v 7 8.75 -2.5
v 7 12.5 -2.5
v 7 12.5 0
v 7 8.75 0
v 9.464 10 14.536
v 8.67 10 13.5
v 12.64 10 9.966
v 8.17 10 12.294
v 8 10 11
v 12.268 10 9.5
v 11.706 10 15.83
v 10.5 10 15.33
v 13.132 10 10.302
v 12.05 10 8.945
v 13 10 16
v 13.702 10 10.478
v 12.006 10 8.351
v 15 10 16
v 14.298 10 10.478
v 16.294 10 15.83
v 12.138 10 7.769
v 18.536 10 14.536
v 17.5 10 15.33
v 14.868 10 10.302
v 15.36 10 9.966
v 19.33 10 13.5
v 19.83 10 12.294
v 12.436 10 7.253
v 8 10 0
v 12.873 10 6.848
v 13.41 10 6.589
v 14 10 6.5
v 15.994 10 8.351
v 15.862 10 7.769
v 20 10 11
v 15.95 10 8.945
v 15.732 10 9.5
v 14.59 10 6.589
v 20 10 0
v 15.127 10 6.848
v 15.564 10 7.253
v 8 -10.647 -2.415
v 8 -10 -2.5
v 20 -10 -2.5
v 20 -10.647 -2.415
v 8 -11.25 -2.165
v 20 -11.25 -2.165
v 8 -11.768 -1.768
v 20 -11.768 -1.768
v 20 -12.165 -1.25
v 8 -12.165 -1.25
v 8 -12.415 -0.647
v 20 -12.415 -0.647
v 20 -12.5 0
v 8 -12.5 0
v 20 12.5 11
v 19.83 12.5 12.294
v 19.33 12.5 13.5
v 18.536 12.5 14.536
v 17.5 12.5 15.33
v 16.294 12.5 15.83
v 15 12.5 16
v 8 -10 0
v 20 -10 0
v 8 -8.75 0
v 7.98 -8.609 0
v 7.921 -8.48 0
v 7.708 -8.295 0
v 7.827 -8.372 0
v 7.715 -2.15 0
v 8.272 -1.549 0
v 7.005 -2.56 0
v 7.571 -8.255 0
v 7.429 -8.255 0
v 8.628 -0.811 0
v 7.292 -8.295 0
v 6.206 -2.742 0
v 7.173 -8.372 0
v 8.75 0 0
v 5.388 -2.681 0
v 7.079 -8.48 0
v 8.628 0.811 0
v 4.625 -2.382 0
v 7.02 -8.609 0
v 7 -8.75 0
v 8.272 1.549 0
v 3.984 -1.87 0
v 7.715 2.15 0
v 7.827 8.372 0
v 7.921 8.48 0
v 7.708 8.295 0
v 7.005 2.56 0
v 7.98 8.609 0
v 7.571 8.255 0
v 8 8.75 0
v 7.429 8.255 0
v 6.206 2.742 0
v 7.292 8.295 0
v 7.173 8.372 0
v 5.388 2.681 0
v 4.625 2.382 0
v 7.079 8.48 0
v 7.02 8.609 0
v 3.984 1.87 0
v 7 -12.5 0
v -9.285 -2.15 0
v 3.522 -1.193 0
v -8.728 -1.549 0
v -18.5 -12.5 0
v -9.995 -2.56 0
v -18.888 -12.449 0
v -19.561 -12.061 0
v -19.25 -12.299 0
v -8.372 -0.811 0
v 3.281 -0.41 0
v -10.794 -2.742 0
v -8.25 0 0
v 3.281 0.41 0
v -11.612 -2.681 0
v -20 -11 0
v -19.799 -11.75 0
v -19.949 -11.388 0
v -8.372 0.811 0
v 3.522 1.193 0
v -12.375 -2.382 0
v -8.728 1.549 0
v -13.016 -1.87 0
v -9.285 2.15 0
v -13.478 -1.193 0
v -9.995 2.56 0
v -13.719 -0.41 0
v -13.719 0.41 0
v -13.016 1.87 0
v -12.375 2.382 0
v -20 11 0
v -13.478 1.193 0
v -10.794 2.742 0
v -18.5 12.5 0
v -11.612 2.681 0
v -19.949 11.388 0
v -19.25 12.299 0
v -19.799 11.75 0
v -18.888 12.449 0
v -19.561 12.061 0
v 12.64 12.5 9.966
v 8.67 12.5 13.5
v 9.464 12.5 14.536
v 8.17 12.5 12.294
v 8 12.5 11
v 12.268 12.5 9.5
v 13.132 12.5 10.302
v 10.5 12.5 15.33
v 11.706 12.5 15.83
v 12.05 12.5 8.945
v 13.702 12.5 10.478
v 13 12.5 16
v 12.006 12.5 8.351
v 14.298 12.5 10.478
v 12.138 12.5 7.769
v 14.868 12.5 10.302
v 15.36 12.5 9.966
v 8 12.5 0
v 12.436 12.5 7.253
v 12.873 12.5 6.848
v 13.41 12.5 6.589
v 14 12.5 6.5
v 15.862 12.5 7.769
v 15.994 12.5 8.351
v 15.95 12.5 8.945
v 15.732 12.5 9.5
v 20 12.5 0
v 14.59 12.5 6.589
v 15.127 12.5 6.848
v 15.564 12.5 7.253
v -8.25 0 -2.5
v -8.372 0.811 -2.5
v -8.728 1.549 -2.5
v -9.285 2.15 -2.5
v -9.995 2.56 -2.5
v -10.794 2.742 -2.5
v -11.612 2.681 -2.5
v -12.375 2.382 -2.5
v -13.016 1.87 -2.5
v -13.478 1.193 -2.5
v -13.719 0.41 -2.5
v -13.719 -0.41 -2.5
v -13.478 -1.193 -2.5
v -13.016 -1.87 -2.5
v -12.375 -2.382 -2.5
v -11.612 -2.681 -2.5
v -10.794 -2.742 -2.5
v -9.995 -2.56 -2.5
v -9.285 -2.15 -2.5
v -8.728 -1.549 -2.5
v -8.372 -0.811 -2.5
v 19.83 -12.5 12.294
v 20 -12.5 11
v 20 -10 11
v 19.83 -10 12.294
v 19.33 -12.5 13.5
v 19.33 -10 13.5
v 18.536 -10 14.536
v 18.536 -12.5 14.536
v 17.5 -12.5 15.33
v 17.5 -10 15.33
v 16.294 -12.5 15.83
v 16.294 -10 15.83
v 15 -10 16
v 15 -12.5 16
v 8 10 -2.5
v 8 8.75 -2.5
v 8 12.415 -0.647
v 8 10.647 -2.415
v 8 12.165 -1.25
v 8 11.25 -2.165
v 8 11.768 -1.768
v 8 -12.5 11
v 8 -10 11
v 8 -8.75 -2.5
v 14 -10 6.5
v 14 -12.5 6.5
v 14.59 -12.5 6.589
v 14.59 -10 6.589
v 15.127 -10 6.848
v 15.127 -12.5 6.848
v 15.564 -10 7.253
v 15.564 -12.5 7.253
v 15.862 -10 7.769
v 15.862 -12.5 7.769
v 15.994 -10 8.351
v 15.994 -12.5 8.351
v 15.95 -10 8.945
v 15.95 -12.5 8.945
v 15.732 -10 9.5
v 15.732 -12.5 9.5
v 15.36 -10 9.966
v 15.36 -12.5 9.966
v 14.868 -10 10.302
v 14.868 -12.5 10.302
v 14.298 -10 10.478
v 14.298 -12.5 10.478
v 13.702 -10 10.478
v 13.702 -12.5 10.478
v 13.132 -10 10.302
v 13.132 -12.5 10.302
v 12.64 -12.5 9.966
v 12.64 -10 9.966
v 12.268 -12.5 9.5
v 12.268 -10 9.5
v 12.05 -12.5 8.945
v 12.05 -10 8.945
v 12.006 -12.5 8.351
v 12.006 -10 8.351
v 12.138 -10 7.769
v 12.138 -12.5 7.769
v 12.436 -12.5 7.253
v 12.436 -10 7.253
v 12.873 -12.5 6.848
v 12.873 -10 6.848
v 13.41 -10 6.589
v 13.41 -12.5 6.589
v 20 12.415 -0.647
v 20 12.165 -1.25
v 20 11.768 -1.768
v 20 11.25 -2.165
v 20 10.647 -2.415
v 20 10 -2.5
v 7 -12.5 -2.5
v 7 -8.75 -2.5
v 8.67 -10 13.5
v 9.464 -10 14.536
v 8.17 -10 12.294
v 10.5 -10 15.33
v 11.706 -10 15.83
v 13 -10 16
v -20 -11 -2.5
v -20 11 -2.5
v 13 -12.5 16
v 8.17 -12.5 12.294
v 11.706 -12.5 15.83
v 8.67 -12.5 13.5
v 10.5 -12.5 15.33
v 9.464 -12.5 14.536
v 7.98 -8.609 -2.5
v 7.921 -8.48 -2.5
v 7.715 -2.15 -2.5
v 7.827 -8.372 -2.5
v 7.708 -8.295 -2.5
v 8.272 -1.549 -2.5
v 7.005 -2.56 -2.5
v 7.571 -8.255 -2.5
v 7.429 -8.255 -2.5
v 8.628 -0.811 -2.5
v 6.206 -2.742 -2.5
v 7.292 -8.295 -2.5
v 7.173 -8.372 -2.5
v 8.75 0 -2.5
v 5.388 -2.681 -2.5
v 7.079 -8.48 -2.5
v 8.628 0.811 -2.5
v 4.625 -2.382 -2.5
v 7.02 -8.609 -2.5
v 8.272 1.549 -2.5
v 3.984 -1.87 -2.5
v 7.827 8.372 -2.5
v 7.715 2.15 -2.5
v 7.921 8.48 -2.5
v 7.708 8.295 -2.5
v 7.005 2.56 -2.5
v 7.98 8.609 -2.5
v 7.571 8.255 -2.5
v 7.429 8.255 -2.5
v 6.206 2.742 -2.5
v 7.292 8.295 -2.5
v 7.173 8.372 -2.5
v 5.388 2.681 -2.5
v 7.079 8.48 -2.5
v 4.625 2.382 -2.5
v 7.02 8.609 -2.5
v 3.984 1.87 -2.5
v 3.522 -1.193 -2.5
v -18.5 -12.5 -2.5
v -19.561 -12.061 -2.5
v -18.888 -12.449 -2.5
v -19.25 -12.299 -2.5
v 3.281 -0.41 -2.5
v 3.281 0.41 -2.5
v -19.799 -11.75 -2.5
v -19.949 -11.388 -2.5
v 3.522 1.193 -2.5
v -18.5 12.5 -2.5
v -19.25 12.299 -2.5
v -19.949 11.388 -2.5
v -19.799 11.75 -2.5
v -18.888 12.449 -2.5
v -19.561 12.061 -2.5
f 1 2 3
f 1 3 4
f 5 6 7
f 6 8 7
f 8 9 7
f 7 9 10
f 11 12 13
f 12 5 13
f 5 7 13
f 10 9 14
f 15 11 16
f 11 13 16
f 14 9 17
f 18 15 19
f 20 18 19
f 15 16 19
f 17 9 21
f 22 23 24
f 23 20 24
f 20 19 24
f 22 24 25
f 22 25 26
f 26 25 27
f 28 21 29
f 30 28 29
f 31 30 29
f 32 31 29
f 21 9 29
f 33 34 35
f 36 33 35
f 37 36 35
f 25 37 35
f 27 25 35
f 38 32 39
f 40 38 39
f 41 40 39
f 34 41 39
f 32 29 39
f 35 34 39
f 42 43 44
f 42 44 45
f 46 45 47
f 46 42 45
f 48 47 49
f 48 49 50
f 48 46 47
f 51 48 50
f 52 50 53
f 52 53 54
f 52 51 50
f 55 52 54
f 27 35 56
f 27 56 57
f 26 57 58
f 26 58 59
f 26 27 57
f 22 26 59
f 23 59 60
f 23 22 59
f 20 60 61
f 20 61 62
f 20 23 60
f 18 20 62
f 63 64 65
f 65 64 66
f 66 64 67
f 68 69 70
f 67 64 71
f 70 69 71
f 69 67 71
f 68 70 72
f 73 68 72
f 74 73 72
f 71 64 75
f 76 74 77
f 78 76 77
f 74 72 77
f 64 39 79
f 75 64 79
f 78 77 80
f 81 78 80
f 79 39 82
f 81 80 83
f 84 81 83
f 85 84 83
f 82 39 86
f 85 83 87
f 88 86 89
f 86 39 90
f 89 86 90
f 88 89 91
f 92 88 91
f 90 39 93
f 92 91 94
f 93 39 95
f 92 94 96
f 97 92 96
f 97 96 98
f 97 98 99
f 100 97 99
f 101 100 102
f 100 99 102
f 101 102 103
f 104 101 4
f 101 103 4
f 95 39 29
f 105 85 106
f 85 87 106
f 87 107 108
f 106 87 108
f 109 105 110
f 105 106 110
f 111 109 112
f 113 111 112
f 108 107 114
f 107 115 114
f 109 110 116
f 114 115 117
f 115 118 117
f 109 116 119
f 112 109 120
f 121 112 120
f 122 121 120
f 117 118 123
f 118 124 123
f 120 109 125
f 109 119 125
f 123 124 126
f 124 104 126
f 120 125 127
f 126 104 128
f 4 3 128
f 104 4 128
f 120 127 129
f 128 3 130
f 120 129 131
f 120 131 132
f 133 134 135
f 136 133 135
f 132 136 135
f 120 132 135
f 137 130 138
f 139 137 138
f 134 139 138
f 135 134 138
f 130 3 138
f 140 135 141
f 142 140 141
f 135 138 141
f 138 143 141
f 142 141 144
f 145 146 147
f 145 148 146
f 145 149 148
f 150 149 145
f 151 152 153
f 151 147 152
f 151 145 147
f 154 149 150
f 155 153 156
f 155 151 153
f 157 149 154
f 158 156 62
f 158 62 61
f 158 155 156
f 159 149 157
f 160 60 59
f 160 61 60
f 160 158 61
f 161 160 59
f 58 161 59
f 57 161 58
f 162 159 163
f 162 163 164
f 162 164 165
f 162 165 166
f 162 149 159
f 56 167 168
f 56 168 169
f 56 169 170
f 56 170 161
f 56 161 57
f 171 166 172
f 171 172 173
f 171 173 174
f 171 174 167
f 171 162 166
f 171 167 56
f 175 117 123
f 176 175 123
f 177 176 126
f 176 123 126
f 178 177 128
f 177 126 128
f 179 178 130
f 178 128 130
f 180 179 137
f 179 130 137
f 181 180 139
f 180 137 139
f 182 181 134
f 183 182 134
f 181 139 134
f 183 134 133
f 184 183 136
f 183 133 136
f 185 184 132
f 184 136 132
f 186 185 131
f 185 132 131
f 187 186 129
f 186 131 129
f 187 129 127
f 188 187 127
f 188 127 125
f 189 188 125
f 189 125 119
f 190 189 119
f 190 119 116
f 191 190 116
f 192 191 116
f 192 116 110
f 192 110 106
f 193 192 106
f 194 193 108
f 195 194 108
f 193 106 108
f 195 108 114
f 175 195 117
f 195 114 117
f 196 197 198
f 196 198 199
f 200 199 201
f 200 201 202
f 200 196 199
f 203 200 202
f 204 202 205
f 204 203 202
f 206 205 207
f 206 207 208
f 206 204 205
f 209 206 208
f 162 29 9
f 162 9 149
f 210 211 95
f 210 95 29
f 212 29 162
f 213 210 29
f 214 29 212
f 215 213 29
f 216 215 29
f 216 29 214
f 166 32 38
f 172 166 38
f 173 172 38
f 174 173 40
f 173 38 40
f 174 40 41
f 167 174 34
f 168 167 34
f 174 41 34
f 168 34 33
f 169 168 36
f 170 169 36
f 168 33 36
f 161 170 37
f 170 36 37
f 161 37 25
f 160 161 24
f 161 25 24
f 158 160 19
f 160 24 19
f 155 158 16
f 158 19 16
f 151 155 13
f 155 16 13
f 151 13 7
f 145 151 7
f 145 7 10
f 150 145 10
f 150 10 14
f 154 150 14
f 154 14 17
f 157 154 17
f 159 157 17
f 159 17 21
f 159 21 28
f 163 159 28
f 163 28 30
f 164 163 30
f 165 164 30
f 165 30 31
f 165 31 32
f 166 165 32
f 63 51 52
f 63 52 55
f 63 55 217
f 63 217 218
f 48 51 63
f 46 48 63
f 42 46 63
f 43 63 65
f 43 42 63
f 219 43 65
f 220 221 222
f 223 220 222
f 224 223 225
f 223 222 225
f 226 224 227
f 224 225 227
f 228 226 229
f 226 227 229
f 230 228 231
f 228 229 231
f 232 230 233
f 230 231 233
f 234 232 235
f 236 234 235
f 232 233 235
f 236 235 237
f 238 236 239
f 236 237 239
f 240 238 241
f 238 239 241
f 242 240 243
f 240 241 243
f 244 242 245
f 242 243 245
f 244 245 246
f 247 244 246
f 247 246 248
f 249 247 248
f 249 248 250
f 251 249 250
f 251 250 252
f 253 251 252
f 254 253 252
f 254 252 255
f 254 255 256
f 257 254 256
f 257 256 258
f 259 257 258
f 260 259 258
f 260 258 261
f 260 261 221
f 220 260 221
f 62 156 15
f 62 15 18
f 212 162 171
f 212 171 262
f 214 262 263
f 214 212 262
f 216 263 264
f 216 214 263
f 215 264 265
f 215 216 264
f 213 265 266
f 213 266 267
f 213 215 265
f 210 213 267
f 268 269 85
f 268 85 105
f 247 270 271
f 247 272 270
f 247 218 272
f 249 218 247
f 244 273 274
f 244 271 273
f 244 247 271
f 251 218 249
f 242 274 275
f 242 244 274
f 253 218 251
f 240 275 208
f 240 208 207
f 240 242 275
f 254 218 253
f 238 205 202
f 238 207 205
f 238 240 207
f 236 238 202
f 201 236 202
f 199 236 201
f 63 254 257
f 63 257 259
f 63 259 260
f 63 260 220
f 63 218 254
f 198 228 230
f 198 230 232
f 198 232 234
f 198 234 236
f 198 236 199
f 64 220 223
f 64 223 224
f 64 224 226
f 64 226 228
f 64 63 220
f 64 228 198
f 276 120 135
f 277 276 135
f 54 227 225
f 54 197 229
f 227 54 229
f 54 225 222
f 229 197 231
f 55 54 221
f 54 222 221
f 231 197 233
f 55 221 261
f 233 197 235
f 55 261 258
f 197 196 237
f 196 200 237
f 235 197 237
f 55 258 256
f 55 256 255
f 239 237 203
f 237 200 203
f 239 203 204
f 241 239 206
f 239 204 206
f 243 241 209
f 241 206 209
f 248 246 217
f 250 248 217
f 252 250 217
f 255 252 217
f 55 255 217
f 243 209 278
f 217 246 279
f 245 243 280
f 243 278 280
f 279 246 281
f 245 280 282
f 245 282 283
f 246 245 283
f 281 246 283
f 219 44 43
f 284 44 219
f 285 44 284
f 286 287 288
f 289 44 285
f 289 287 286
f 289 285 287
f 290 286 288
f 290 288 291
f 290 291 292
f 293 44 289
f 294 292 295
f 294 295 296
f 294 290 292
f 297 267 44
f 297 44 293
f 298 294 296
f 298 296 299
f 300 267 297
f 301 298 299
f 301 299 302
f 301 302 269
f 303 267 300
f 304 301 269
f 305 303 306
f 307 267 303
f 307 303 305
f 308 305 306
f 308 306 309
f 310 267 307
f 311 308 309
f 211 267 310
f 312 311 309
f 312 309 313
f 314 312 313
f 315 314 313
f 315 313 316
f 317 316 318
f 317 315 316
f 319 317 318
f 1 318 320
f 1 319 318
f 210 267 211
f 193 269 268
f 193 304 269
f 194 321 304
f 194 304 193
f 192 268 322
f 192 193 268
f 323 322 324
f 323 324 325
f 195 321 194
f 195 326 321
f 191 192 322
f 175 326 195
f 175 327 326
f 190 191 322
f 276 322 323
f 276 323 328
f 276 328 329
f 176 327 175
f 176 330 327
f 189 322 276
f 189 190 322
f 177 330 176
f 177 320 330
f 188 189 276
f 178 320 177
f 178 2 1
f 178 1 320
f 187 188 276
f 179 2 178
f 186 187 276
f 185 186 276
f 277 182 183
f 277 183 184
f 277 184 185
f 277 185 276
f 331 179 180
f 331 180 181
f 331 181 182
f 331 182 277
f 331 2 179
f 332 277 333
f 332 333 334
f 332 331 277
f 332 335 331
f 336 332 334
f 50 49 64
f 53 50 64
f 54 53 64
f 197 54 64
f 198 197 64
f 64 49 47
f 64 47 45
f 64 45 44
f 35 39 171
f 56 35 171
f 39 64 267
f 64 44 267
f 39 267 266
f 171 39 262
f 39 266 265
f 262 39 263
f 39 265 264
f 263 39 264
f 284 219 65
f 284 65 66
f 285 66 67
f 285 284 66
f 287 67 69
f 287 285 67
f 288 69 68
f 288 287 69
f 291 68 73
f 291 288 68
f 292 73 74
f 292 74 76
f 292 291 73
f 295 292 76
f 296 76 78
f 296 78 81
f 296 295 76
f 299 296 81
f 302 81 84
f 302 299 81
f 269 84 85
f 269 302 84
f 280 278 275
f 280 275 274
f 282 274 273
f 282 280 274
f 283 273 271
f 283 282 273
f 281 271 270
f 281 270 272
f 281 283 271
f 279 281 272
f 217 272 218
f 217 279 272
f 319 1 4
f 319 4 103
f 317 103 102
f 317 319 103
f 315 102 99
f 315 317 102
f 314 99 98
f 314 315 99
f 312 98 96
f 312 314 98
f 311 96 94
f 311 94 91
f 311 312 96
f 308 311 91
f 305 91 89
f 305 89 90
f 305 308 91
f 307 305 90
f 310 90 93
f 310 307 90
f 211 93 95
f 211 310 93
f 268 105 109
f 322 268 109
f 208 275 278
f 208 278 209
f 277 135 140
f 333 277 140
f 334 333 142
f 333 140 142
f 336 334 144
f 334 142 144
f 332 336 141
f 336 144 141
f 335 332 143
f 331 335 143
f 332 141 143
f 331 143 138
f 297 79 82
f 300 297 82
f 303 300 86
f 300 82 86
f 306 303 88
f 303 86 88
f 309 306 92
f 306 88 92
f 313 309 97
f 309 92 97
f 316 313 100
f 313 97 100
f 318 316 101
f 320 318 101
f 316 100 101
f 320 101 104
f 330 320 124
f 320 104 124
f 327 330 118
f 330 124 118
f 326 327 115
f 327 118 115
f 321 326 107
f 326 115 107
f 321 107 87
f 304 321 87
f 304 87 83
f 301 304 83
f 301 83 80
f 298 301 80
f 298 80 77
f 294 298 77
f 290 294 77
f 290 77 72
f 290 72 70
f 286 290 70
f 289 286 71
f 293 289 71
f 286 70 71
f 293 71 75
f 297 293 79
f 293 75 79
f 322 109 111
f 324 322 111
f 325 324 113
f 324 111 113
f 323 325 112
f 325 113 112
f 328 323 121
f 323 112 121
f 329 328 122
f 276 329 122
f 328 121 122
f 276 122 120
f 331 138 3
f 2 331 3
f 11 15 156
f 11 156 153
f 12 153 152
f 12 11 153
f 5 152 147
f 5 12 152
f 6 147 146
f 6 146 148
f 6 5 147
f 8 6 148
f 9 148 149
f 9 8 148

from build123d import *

# Parameters (mm, degrees)
SCHIZZO1_R                 = 2.75
BASE_FLANGIA1_DEPTH        = 2.5
BORDO_FLANGIA1_START       = -2.5
BORDO_FLANGIA1_DEPTH       = 2.5
BORDO_FLANGIA1_2_OUTLINE_W = 12
BORDO_FLANGIA1_2_OUTLINE_H = 2.5
BORDO_FLANGIA1_2_DEPTH     = 16
BORDO_FLANGIA1_START_2     = 8
BORDO_FLANGIA1_3_DEPTH     = 13
SCHIZZO12_R                = 2
TAGLIO_ESTRUSIONE1_DEPTH   = 25
TAGLIO_ESTRUSIONE2_DEPTH   = 25


with BuildPart() as part:
    # Base-Flangia1: sheet metal written as solids
    # Schizzo1 → Base-Flangia1 (new body)
    with BuildSketch(Plane.XY):
        with BuildLine():
            Line((20, -12.5), (-18.5, -12.5))
            ThreePointArc((-18.5, -12.5), (-19.560660172, -12.060660172), (-20, -11))
            Line((-20, -11), (-20, 11))
            ThreePointArc((-20, 11), (-19.560660172, 12.060660172), (-18.5, 12.5))
            Line((-18.5, 12.5), (20, 12.5))
            Line((20, 12.5), (20, -12.5))
        make_face()
        with Locations((-11, 0)):
            Circle(SCHIZZO1_R, mode=Mode.SUBTRACT)
        with Locations((6, 0)):
            Circle(SCHIZZO1_R, mode=Mode.SUBTRACT)
    extrude(amount=-BASE_FLANGIA1_DEPTH)

    # Bordo-Flangia1: read off the stored shape, not the designer's step
    # Bordo-Flangia1 outline → Bordo-Flangia1 (cut)
    with BuildSketch(Plane.XY.offset(BORDO_FLANGIA1_START)):
        with BuildLine():
            Line((8, 8.75), (8, 12.5))
            Line((8, 12.5), (7, 12.5))
            Line((7, 12.5), (7, 8.75))
            ThreePointArc((7, 8.75), (7.5, 8.25), (8, 8.75))
        make_face()
        with BuildLine():
            Line((8, -12.5), (8, -8.75))
            ThreePointArc((8, -8.75), (7.5, -8.25), (7, -8.75))
            Line((7, -8.75), (7, -12.5))
            Line((7, -12.5), (8, -12.5))
        make_face()
    extrude(amount=BORDO_FLANGIA1_DEPTH, mode=Mode.SUBTRACT)

    # Bordo-Flangia1 2 outline → Bordo-Flangia1 2 (add)
    with BuildSketch(Plane.XY):
        with Locations((14, 11.25)):
            Rectangle(BORDO_FLANGIA1_2_OUTLINE_W, BORDO_FLANGIA1_2_OUTLINE_H)
        with Locations((14, -11.25)):
            Rectangle(BORDO_FLANGIA1_2_OUTLINE_W, BORDO_FLANGIA1_2_OUTLINE_H)
    extrude(amount=BORDO_FLANGIA1_2_DEPTH)

    # Bordo-Flangia1 3 outline → Bordo-Flangia1 3 (cut)
    with BuildSketch(Plane.YZ.offset(BORDO_FLANGIA1_START_2)):
        with BuildLine():
            Line((-12.5, -2.5), (-10, -2.5))
            ThreePointArc((-10, -2.5), (-11.767766953, -1.767766953), (-12.5, 0))
            Line((-12.5, 0), (-12.5, -2.5))
        make_face()
        with BuildLine():
            ThreePointArc((12.5, 0), (11.767766953, -1.767766953), (10, -2.5))
            Line((10, -2.5), (12.5, -2.5))
            Line((12.5, -2.5), (12.5, 0))
        make_face()
    extrude(amount=BORDO_FLANGIA1_3_DEPTH, mode=Mode.SUBTRACT)

    # Schizzo12 → Taglio-Estrusione1 (cut)
    with BuildSketch(Plane.XZ.offset(12.5)):
        with Locations(Location((14, 8.5, 0), (0, 0, 270))):
            Circle(SCHIZZO12_R)
    extrude(amount=-TAGLIO_ESTRUSIONE1_DEPTH, mode=Mode.SUBTRACT)

    # Schizzo13 → Taglio-Estrusione2 (cut)
    with BuildSketch(Plane.XZ.offset(12.5)):
        with BuildLine():
            Line((8, 11), (8, 16))
            Line((8, 16), (13, 16))
            ThreePointArc((13, 16), (9.464466094, 14.535533906), (8, 11))
        make_face()
        with BuildLine():
            Line((20, 16), (20, 11))
            ThreePointArc((20, 11), (18.535533906, 14.535533906), (15, 16))
            Line((15, 16), (20, 16))
        make_face()
    extrude(amount=-TAGLIO_ESTRUSIONE2_DEPTH, mode=Mode.SUBTRACT)


solid = part.part
